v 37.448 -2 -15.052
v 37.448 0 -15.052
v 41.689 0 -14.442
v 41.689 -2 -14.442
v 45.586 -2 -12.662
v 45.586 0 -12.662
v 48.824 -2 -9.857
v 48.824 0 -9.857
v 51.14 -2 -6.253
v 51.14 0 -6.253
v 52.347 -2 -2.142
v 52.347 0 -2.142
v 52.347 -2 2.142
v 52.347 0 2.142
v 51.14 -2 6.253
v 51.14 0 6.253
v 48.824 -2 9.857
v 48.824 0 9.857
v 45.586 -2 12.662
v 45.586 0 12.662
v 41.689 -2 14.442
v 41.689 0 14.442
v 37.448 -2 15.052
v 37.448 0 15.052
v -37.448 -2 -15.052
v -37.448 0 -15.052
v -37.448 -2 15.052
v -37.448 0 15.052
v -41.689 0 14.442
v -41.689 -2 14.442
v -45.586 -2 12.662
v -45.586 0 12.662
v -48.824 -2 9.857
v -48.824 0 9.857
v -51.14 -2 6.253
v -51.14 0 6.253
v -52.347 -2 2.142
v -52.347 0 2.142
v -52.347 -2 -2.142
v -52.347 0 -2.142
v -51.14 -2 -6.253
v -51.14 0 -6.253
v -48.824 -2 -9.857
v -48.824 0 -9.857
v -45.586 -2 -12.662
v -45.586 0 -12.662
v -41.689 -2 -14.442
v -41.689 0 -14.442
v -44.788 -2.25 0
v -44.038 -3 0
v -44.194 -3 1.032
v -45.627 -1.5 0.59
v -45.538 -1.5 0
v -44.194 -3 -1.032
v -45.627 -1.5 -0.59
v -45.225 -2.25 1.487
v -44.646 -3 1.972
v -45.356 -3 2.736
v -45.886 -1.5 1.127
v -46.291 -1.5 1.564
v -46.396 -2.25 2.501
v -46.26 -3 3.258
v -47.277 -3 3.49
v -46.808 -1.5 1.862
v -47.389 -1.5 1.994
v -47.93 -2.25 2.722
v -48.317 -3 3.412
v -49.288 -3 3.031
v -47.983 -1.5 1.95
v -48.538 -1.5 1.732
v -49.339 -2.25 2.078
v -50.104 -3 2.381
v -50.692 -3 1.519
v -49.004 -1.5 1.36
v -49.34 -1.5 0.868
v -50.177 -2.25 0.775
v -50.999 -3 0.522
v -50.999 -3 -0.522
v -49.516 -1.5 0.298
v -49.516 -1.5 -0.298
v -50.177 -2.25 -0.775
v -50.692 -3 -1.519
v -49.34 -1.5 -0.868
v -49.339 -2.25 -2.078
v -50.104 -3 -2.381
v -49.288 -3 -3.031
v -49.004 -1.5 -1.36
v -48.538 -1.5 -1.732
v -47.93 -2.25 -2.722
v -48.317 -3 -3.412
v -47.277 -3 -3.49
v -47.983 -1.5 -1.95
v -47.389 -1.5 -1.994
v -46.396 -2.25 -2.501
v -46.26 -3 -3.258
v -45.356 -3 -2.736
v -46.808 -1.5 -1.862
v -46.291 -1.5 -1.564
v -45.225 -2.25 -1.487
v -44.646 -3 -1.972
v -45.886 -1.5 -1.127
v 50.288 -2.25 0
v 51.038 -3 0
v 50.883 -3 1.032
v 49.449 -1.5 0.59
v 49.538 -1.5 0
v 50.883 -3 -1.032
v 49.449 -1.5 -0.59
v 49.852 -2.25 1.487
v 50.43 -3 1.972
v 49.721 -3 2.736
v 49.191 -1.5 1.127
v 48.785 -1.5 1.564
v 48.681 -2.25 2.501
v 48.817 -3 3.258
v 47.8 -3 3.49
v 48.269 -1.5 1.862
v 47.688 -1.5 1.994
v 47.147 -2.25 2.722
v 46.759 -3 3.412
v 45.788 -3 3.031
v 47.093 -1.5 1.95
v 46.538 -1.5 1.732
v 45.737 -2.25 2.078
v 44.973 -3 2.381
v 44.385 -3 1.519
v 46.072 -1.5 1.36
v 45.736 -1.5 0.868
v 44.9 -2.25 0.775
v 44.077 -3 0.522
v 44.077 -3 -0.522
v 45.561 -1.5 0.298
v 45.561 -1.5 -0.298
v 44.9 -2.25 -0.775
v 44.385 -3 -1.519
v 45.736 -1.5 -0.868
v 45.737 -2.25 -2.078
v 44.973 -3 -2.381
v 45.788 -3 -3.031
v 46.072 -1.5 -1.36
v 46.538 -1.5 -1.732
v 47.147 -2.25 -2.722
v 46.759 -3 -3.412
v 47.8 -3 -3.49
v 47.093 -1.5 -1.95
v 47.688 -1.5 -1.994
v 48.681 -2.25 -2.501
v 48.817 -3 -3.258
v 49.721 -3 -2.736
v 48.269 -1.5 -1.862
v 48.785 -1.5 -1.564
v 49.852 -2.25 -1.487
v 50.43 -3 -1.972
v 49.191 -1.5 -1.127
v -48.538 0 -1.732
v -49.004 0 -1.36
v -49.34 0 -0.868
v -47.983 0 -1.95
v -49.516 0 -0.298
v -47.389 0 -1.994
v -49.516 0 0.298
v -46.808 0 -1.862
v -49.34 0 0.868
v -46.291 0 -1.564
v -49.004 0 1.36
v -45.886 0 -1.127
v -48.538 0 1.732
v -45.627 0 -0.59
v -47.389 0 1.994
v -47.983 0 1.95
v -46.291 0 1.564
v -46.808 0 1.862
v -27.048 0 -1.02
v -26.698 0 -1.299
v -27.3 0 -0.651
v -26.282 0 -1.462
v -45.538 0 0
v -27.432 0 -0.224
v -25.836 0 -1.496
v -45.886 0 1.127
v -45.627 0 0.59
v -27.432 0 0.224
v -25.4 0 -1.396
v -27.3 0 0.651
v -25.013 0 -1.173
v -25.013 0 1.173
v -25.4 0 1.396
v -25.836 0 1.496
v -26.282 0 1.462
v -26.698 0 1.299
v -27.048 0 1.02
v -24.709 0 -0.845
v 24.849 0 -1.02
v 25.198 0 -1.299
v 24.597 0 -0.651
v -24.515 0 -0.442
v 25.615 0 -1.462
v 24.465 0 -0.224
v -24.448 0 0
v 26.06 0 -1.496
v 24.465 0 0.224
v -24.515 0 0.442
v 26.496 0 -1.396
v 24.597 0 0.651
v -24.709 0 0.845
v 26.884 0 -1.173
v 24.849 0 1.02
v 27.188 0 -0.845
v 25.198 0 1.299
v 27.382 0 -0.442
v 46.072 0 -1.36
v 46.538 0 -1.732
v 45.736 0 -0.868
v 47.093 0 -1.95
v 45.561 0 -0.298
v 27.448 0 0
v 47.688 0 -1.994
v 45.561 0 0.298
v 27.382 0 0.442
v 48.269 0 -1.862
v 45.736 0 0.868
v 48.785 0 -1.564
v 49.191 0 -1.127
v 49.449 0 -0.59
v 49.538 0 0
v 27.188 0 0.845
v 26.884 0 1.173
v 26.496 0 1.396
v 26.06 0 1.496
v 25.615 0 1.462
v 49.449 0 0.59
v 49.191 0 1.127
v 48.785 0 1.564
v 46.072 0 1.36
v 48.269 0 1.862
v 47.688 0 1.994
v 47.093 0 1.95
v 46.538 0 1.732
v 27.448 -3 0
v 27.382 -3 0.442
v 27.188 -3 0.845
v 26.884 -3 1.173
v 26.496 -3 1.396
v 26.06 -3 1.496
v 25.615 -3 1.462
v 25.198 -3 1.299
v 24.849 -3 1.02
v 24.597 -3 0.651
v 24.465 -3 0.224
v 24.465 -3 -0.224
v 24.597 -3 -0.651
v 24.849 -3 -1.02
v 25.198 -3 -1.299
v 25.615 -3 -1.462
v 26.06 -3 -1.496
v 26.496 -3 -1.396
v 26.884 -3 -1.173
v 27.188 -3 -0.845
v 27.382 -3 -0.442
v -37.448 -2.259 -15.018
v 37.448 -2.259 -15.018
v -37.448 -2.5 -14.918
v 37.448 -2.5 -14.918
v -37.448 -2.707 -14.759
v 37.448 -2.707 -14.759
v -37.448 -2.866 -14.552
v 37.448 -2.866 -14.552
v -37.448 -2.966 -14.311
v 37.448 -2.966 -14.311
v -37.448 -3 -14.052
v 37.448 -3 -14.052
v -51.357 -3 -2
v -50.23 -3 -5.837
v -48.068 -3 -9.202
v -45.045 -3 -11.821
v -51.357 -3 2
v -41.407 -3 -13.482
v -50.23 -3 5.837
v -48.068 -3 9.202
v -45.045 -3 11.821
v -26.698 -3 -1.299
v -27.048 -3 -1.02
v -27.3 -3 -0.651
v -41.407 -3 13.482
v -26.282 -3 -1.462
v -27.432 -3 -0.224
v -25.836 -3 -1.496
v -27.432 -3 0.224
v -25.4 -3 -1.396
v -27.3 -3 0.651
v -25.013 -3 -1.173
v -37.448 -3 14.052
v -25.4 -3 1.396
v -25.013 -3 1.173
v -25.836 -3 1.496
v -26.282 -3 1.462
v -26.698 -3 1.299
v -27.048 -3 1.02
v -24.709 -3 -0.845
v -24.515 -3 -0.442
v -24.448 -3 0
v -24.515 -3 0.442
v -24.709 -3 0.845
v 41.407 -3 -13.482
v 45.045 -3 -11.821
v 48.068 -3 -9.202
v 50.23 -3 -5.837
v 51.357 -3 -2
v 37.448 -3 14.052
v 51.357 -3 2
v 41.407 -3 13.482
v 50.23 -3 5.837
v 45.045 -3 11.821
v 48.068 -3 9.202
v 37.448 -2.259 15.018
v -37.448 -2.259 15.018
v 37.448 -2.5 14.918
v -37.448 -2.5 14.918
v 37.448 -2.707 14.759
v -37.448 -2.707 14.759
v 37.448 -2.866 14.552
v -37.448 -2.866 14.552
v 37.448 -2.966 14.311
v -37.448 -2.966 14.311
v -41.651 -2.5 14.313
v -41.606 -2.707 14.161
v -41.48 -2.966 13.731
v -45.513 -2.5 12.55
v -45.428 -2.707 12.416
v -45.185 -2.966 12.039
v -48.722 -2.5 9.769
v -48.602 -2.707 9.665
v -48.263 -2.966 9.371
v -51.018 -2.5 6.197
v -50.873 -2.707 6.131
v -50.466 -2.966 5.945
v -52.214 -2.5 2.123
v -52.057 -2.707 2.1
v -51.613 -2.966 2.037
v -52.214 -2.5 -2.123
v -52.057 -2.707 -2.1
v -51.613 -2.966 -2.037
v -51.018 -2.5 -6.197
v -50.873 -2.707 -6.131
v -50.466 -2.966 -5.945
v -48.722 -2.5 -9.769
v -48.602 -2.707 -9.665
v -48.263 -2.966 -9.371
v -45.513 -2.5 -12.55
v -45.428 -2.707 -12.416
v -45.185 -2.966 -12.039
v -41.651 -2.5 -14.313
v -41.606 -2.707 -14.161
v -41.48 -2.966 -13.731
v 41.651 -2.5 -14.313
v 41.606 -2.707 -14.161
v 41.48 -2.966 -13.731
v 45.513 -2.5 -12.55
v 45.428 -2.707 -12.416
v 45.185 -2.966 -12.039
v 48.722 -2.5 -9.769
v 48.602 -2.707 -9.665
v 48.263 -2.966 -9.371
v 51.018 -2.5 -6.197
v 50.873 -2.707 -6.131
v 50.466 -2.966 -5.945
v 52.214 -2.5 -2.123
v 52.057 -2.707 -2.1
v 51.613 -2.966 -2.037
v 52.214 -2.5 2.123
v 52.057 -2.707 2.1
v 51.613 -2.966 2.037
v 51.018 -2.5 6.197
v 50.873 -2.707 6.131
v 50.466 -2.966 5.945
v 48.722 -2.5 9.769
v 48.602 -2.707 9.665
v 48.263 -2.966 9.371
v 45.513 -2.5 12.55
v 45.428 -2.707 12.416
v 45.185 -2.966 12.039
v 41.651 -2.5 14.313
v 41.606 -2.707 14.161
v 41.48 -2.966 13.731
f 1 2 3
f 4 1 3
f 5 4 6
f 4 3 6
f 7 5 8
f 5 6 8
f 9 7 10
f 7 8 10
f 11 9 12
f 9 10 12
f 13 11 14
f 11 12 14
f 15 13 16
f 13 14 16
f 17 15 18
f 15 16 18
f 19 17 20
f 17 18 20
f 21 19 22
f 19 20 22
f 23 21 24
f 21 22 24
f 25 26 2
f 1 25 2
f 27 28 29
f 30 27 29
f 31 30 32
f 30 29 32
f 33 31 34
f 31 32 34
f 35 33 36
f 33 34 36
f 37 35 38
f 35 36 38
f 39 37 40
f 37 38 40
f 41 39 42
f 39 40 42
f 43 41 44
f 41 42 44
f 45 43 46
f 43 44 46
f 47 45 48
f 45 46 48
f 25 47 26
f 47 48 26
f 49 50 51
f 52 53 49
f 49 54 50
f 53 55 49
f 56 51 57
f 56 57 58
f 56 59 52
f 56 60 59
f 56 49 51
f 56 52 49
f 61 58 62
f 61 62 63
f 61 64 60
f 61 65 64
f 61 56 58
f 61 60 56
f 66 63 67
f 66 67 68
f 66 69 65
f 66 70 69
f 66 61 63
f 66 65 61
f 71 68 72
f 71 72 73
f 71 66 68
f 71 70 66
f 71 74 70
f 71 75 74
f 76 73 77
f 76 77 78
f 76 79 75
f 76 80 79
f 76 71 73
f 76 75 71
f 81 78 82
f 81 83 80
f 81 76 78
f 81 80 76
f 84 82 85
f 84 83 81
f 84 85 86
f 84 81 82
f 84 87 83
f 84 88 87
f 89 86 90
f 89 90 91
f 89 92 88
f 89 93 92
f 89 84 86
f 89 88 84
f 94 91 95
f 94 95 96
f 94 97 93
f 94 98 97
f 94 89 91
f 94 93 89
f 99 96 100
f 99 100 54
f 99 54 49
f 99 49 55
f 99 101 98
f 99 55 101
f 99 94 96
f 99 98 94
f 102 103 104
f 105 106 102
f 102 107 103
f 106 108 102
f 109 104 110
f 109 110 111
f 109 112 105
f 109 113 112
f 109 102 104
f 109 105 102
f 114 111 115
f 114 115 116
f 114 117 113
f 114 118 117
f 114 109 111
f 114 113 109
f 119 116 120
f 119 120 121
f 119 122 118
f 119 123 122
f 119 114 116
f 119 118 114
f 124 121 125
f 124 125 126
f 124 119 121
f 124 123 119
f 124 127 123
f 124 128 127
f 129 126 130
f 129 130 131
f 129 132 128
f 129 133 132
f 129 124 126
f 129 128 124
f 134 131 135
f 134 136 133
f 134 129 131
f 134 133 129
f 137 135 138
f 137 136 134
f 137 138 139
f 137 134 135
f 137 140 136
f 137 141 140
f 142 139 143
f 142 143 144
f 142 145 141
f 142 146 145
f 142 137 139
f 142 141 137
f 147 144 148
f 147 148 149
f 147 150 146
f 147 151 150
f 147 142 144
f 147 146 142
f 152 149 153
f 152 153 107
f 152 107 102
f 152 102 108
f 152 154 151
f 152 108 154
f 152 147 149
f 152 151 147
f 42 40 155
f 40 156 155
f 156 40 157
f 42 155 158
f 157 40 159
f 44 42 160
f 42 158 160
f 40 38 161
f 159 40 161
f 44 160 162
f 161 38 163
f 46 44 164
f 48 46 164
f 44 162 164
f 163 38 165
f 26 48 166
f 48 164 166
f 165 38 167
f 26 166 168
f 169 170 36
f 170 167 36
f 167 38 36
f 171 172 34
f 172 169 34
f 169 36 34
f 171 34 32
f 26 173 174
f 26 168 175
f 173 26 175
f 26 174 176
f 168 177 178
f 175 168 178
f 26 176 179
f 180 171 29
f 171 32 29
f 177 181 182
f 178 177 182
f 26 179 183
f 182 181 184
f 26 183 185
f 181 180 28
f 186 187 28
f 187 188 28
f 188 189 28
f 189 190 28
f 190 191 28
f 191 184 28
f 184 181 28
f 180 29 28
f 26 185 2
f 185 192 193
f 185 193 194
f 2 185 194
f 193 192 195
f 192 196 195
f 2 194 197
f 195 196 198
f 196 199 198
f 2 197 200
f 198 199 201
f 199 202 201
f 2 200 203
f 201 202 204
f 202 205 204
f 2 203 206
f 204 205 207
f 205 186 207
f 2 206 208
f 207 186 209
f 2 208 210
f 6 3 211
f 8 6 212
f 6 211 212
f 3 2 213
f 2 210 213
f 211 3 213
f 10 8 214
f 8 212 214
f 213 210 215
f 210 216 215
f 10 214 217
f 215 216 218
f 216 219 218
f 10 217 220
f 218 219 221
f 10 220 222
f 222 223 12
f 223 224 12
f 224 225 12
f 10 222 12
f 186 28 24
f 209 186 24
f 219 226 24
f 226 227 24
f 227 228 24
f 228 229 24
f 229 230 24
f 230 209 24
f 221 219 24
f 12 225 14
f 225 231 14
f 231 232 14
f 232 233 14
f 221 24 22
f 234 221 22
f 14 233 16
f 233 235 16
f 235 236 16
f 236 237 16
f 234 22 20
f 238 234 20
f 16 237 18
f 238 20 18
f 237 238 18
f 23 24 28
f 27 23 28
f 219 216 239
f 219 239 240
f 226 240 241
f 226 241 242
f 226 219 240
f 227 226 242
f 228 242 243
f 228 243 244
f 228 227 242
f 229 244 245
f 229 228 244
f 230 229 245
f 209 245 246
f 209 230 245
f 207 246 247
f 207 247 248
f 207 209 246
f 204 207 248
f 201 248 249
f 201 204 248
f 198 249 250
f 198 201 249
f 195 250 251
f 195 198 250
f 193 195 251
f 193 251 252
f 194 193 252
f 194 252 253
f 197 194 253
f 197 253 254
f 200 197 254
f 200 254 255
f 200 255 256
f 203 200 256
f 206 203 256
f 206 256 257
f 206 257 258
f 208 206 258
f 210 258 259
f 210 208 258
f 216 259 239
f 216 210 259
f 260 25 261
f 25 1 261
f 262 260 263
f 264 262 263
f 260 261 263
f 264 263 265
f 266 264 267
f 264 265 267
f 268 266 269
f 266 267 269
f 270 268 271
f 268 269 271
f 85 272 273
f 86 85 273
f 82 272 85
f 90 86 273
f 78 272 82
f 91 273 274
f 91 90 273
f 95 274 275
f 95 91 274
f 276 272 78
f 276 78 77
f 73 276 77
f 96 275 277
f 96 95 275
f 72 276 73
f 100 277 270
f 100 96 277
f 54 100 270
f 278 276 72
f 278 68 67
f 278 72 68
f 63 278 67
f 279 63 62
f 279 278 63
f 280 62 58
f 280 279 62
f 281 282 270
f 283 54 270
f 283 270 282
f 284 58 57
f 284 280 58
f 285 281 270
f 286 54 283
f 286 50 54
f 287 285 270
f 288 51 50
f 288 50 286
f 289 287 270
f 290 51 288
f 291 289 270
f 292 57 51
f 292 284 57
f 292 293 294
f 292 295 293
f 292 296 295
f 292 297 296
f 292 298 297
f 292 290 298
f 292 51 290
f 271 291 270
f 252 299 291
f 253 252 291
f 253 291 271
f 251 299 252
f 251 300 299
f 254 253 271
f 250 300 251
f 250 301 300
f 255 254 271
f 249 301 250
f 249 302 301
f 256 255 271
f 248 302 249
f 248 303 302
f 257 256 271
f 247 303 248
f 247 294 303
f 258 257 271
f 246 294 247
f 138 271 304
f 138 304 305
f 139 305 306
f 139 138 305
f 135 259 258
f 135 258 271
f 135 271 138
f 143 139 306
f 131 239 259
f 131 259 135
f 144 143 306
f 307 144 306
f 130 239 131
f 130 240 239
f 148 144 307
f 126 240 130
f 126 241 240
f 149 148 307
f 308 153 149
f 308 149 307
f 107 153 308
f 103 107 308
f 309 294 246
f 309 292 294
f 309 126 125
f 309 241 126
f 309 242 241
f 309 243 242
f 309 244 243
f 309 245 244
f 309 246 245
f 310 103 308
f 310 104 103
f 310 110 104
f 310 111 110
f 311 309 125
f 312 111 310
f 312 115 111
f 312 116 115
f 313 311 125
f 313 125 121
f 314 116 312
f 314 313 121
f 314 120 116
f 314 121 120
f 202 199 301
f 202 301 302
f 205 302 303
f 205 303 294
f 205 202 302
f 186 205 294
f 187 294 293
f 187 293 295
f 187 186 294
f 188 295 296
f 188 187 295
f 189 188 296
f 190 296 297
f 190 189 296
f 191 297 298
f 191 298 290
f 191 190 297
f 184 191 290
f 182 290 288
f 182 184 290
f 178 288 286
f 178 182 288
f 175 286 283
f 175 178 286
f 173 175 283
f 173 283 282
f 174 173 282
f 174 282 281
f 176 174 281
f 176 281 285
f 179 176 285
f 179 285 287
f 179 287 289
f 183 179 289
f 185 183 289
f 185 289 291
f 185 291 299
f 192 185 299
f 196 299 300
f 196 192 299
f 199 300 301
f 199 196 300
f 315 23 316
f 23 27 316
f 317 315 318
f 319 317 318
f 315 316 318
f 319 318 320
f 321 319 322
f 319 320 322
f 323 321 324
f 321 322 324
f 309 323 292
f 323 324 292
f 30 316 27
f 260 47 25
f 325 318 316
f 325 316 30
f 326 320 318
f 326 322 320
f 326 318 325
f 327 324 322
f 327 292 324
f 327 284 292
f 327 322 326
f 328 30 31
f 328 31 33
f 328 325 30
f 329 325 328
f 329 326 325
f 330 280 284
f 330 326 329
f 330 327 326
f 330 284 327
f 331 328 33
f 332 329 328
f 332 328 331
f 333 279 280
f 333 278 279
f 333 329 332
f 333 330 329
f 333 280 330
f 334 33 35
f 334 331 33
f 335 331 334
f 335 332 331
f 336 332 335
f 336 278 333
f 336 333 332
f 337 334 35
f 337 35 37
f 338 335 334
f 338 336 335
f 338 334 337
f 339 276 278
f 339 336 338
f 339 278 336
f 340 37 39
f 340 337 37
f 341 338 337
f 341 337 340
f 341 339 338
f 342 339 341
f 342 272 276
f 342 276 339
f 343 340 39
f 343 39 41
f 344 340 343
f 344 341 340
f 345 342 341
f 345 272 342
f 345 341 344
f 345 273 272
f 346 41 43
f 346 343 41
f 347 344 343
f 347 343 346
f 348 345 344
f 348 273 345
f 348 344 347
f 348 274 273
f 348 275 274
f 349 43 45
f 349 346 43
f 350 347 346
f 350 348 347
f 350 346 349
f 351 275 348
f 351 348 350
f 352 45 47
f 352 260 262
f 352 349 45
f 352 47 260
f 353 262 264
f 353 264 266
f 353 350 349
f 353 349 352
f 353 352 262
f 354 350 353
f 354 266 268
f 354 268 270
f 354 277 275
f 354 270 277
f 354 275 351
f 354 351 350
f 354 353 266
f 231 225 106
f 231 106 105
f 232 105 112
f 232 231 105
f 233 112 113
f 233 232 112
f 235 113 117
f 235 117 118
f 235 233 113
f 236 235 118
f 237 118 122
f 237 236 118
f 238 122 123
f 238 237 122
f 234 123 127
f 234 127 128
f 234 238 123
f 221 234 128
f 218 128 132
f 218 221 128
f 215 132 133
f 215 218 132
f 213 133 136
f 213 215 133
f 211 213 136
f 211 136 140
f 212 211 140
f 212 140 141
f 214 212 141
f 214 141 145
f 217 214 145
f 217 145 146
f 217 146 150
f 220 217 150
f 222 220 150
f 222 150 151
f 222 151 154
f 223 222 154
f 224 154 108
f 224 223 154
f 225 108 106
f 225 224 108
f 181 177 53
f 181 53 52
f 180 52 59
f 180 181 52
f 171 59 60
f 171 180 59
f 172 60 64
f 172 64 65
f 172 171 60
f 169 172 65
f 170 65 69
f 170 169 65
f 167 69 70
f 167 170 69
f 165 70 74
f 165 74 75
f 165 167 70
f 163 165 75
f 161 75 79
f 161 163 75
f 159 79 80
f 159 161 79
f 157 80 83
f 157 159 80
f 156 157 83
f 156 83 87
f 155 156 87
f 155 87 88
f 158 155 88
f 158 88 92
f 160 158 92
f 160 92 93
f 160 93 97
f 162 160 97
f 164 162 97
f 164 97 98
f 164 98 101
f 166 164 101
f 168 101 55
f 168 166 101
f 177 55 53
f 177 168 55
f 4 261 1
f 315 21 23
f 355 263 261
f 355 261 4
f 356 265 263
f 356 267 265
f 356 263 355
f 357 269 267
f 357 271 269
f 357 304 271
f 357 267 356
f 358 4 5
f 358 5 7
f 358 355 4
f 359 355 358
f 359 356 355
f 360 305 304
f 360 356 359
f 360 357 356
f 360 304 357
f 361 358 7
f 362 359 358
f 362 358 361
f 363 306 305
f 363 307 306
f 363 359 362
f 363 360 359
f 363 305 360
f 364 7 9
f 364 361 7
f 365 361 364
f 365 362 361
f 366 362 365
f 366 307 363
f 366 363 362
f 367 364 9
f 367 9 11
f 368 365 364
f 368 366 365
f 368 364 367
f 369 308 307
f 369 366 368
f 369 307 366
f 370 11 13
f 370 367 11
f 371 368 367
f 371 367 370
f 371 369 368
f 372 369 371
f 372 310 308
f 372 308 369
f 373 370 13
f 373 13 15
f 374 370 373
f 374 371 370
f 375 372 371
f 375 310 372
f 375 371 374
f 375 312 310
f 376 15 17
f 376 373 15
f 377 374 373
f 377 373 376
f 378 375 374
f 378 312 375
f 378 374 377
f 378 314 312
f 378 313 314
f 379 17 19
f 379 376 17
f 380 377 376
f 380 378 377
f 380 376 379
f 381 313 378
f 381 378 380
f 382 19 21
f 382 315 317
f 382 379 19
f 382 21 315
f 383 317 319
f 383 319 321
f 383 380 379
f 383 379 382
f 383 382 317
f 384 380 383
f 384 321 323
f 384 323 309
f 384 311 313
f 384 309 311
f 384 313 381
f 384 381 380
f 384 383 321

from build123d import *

# Parameters (mm, degrees)
F0_R     = 2
F0_R_2   = 1.5
F1_DEPTH = 3
F2_R     = 1
F3_SIZE  = 1.5
F4_SIZE  = 1.5


with BuildPart() as f1:
    # F0 (on Front) → F1 (new body)
    with BuildSketch(Plane.XZ):
        with BuildLine():
            Line((37.448312, 15.051688), (-37.448312, 15.051688))
            ThreePointArc((-37.448312, 15.051688), (-52.5, 0), (-37.448312, -15.051688))
            Line((-37.448312, -15.051688), (37.448312, -15.051688))
            ThreePointArc((37.448312, -15.051688), (52.5, 0), (37.448312, 15.051688))
        make_face()
        with Locations((-47.538312, 0)):
            Circle(F0_R, mode=Mode.SUBTRACT)
        with Locations((-25.948312, 0)):
            Circle(F0_R_2, mode=Mode.SUBTRACT)
        with Locations((25.948312, 0)):
            Circle(F0_R_2, mode=Mode.SUBTRACT)
        with Locations((47.538312, 0)):
            Circle(F0_R, mode=Mode.SUBTRACT)
    extrude(amount=F1_DEPTH)

    # F2
    f2_edges = [f1.edges().sort_by_distance(p)[0] for p in [
        (0, -3, 15.051688),
        (-52.5, -3, 0),
        (0, -3, -15.051688),
        (52.5, -3, 0),
    ]]
    fillet(f2_edges, radius=F2_R)

    # F3
    f3_edges = [f1.edges().sort_by_distance(p)[0] for p in [
        (-49.538312, -3, 0),
    ]]
    chamfer(f3_edges, length=F3_SIZE)

    # F4
    f4_edges = [f1.edges().sort_by_distance(p)[0] for p in [
        (45.538312, -3, 0),
    ]]
    chamfer(f4_edges, length=F4_SIZE)


solid = f1.part
